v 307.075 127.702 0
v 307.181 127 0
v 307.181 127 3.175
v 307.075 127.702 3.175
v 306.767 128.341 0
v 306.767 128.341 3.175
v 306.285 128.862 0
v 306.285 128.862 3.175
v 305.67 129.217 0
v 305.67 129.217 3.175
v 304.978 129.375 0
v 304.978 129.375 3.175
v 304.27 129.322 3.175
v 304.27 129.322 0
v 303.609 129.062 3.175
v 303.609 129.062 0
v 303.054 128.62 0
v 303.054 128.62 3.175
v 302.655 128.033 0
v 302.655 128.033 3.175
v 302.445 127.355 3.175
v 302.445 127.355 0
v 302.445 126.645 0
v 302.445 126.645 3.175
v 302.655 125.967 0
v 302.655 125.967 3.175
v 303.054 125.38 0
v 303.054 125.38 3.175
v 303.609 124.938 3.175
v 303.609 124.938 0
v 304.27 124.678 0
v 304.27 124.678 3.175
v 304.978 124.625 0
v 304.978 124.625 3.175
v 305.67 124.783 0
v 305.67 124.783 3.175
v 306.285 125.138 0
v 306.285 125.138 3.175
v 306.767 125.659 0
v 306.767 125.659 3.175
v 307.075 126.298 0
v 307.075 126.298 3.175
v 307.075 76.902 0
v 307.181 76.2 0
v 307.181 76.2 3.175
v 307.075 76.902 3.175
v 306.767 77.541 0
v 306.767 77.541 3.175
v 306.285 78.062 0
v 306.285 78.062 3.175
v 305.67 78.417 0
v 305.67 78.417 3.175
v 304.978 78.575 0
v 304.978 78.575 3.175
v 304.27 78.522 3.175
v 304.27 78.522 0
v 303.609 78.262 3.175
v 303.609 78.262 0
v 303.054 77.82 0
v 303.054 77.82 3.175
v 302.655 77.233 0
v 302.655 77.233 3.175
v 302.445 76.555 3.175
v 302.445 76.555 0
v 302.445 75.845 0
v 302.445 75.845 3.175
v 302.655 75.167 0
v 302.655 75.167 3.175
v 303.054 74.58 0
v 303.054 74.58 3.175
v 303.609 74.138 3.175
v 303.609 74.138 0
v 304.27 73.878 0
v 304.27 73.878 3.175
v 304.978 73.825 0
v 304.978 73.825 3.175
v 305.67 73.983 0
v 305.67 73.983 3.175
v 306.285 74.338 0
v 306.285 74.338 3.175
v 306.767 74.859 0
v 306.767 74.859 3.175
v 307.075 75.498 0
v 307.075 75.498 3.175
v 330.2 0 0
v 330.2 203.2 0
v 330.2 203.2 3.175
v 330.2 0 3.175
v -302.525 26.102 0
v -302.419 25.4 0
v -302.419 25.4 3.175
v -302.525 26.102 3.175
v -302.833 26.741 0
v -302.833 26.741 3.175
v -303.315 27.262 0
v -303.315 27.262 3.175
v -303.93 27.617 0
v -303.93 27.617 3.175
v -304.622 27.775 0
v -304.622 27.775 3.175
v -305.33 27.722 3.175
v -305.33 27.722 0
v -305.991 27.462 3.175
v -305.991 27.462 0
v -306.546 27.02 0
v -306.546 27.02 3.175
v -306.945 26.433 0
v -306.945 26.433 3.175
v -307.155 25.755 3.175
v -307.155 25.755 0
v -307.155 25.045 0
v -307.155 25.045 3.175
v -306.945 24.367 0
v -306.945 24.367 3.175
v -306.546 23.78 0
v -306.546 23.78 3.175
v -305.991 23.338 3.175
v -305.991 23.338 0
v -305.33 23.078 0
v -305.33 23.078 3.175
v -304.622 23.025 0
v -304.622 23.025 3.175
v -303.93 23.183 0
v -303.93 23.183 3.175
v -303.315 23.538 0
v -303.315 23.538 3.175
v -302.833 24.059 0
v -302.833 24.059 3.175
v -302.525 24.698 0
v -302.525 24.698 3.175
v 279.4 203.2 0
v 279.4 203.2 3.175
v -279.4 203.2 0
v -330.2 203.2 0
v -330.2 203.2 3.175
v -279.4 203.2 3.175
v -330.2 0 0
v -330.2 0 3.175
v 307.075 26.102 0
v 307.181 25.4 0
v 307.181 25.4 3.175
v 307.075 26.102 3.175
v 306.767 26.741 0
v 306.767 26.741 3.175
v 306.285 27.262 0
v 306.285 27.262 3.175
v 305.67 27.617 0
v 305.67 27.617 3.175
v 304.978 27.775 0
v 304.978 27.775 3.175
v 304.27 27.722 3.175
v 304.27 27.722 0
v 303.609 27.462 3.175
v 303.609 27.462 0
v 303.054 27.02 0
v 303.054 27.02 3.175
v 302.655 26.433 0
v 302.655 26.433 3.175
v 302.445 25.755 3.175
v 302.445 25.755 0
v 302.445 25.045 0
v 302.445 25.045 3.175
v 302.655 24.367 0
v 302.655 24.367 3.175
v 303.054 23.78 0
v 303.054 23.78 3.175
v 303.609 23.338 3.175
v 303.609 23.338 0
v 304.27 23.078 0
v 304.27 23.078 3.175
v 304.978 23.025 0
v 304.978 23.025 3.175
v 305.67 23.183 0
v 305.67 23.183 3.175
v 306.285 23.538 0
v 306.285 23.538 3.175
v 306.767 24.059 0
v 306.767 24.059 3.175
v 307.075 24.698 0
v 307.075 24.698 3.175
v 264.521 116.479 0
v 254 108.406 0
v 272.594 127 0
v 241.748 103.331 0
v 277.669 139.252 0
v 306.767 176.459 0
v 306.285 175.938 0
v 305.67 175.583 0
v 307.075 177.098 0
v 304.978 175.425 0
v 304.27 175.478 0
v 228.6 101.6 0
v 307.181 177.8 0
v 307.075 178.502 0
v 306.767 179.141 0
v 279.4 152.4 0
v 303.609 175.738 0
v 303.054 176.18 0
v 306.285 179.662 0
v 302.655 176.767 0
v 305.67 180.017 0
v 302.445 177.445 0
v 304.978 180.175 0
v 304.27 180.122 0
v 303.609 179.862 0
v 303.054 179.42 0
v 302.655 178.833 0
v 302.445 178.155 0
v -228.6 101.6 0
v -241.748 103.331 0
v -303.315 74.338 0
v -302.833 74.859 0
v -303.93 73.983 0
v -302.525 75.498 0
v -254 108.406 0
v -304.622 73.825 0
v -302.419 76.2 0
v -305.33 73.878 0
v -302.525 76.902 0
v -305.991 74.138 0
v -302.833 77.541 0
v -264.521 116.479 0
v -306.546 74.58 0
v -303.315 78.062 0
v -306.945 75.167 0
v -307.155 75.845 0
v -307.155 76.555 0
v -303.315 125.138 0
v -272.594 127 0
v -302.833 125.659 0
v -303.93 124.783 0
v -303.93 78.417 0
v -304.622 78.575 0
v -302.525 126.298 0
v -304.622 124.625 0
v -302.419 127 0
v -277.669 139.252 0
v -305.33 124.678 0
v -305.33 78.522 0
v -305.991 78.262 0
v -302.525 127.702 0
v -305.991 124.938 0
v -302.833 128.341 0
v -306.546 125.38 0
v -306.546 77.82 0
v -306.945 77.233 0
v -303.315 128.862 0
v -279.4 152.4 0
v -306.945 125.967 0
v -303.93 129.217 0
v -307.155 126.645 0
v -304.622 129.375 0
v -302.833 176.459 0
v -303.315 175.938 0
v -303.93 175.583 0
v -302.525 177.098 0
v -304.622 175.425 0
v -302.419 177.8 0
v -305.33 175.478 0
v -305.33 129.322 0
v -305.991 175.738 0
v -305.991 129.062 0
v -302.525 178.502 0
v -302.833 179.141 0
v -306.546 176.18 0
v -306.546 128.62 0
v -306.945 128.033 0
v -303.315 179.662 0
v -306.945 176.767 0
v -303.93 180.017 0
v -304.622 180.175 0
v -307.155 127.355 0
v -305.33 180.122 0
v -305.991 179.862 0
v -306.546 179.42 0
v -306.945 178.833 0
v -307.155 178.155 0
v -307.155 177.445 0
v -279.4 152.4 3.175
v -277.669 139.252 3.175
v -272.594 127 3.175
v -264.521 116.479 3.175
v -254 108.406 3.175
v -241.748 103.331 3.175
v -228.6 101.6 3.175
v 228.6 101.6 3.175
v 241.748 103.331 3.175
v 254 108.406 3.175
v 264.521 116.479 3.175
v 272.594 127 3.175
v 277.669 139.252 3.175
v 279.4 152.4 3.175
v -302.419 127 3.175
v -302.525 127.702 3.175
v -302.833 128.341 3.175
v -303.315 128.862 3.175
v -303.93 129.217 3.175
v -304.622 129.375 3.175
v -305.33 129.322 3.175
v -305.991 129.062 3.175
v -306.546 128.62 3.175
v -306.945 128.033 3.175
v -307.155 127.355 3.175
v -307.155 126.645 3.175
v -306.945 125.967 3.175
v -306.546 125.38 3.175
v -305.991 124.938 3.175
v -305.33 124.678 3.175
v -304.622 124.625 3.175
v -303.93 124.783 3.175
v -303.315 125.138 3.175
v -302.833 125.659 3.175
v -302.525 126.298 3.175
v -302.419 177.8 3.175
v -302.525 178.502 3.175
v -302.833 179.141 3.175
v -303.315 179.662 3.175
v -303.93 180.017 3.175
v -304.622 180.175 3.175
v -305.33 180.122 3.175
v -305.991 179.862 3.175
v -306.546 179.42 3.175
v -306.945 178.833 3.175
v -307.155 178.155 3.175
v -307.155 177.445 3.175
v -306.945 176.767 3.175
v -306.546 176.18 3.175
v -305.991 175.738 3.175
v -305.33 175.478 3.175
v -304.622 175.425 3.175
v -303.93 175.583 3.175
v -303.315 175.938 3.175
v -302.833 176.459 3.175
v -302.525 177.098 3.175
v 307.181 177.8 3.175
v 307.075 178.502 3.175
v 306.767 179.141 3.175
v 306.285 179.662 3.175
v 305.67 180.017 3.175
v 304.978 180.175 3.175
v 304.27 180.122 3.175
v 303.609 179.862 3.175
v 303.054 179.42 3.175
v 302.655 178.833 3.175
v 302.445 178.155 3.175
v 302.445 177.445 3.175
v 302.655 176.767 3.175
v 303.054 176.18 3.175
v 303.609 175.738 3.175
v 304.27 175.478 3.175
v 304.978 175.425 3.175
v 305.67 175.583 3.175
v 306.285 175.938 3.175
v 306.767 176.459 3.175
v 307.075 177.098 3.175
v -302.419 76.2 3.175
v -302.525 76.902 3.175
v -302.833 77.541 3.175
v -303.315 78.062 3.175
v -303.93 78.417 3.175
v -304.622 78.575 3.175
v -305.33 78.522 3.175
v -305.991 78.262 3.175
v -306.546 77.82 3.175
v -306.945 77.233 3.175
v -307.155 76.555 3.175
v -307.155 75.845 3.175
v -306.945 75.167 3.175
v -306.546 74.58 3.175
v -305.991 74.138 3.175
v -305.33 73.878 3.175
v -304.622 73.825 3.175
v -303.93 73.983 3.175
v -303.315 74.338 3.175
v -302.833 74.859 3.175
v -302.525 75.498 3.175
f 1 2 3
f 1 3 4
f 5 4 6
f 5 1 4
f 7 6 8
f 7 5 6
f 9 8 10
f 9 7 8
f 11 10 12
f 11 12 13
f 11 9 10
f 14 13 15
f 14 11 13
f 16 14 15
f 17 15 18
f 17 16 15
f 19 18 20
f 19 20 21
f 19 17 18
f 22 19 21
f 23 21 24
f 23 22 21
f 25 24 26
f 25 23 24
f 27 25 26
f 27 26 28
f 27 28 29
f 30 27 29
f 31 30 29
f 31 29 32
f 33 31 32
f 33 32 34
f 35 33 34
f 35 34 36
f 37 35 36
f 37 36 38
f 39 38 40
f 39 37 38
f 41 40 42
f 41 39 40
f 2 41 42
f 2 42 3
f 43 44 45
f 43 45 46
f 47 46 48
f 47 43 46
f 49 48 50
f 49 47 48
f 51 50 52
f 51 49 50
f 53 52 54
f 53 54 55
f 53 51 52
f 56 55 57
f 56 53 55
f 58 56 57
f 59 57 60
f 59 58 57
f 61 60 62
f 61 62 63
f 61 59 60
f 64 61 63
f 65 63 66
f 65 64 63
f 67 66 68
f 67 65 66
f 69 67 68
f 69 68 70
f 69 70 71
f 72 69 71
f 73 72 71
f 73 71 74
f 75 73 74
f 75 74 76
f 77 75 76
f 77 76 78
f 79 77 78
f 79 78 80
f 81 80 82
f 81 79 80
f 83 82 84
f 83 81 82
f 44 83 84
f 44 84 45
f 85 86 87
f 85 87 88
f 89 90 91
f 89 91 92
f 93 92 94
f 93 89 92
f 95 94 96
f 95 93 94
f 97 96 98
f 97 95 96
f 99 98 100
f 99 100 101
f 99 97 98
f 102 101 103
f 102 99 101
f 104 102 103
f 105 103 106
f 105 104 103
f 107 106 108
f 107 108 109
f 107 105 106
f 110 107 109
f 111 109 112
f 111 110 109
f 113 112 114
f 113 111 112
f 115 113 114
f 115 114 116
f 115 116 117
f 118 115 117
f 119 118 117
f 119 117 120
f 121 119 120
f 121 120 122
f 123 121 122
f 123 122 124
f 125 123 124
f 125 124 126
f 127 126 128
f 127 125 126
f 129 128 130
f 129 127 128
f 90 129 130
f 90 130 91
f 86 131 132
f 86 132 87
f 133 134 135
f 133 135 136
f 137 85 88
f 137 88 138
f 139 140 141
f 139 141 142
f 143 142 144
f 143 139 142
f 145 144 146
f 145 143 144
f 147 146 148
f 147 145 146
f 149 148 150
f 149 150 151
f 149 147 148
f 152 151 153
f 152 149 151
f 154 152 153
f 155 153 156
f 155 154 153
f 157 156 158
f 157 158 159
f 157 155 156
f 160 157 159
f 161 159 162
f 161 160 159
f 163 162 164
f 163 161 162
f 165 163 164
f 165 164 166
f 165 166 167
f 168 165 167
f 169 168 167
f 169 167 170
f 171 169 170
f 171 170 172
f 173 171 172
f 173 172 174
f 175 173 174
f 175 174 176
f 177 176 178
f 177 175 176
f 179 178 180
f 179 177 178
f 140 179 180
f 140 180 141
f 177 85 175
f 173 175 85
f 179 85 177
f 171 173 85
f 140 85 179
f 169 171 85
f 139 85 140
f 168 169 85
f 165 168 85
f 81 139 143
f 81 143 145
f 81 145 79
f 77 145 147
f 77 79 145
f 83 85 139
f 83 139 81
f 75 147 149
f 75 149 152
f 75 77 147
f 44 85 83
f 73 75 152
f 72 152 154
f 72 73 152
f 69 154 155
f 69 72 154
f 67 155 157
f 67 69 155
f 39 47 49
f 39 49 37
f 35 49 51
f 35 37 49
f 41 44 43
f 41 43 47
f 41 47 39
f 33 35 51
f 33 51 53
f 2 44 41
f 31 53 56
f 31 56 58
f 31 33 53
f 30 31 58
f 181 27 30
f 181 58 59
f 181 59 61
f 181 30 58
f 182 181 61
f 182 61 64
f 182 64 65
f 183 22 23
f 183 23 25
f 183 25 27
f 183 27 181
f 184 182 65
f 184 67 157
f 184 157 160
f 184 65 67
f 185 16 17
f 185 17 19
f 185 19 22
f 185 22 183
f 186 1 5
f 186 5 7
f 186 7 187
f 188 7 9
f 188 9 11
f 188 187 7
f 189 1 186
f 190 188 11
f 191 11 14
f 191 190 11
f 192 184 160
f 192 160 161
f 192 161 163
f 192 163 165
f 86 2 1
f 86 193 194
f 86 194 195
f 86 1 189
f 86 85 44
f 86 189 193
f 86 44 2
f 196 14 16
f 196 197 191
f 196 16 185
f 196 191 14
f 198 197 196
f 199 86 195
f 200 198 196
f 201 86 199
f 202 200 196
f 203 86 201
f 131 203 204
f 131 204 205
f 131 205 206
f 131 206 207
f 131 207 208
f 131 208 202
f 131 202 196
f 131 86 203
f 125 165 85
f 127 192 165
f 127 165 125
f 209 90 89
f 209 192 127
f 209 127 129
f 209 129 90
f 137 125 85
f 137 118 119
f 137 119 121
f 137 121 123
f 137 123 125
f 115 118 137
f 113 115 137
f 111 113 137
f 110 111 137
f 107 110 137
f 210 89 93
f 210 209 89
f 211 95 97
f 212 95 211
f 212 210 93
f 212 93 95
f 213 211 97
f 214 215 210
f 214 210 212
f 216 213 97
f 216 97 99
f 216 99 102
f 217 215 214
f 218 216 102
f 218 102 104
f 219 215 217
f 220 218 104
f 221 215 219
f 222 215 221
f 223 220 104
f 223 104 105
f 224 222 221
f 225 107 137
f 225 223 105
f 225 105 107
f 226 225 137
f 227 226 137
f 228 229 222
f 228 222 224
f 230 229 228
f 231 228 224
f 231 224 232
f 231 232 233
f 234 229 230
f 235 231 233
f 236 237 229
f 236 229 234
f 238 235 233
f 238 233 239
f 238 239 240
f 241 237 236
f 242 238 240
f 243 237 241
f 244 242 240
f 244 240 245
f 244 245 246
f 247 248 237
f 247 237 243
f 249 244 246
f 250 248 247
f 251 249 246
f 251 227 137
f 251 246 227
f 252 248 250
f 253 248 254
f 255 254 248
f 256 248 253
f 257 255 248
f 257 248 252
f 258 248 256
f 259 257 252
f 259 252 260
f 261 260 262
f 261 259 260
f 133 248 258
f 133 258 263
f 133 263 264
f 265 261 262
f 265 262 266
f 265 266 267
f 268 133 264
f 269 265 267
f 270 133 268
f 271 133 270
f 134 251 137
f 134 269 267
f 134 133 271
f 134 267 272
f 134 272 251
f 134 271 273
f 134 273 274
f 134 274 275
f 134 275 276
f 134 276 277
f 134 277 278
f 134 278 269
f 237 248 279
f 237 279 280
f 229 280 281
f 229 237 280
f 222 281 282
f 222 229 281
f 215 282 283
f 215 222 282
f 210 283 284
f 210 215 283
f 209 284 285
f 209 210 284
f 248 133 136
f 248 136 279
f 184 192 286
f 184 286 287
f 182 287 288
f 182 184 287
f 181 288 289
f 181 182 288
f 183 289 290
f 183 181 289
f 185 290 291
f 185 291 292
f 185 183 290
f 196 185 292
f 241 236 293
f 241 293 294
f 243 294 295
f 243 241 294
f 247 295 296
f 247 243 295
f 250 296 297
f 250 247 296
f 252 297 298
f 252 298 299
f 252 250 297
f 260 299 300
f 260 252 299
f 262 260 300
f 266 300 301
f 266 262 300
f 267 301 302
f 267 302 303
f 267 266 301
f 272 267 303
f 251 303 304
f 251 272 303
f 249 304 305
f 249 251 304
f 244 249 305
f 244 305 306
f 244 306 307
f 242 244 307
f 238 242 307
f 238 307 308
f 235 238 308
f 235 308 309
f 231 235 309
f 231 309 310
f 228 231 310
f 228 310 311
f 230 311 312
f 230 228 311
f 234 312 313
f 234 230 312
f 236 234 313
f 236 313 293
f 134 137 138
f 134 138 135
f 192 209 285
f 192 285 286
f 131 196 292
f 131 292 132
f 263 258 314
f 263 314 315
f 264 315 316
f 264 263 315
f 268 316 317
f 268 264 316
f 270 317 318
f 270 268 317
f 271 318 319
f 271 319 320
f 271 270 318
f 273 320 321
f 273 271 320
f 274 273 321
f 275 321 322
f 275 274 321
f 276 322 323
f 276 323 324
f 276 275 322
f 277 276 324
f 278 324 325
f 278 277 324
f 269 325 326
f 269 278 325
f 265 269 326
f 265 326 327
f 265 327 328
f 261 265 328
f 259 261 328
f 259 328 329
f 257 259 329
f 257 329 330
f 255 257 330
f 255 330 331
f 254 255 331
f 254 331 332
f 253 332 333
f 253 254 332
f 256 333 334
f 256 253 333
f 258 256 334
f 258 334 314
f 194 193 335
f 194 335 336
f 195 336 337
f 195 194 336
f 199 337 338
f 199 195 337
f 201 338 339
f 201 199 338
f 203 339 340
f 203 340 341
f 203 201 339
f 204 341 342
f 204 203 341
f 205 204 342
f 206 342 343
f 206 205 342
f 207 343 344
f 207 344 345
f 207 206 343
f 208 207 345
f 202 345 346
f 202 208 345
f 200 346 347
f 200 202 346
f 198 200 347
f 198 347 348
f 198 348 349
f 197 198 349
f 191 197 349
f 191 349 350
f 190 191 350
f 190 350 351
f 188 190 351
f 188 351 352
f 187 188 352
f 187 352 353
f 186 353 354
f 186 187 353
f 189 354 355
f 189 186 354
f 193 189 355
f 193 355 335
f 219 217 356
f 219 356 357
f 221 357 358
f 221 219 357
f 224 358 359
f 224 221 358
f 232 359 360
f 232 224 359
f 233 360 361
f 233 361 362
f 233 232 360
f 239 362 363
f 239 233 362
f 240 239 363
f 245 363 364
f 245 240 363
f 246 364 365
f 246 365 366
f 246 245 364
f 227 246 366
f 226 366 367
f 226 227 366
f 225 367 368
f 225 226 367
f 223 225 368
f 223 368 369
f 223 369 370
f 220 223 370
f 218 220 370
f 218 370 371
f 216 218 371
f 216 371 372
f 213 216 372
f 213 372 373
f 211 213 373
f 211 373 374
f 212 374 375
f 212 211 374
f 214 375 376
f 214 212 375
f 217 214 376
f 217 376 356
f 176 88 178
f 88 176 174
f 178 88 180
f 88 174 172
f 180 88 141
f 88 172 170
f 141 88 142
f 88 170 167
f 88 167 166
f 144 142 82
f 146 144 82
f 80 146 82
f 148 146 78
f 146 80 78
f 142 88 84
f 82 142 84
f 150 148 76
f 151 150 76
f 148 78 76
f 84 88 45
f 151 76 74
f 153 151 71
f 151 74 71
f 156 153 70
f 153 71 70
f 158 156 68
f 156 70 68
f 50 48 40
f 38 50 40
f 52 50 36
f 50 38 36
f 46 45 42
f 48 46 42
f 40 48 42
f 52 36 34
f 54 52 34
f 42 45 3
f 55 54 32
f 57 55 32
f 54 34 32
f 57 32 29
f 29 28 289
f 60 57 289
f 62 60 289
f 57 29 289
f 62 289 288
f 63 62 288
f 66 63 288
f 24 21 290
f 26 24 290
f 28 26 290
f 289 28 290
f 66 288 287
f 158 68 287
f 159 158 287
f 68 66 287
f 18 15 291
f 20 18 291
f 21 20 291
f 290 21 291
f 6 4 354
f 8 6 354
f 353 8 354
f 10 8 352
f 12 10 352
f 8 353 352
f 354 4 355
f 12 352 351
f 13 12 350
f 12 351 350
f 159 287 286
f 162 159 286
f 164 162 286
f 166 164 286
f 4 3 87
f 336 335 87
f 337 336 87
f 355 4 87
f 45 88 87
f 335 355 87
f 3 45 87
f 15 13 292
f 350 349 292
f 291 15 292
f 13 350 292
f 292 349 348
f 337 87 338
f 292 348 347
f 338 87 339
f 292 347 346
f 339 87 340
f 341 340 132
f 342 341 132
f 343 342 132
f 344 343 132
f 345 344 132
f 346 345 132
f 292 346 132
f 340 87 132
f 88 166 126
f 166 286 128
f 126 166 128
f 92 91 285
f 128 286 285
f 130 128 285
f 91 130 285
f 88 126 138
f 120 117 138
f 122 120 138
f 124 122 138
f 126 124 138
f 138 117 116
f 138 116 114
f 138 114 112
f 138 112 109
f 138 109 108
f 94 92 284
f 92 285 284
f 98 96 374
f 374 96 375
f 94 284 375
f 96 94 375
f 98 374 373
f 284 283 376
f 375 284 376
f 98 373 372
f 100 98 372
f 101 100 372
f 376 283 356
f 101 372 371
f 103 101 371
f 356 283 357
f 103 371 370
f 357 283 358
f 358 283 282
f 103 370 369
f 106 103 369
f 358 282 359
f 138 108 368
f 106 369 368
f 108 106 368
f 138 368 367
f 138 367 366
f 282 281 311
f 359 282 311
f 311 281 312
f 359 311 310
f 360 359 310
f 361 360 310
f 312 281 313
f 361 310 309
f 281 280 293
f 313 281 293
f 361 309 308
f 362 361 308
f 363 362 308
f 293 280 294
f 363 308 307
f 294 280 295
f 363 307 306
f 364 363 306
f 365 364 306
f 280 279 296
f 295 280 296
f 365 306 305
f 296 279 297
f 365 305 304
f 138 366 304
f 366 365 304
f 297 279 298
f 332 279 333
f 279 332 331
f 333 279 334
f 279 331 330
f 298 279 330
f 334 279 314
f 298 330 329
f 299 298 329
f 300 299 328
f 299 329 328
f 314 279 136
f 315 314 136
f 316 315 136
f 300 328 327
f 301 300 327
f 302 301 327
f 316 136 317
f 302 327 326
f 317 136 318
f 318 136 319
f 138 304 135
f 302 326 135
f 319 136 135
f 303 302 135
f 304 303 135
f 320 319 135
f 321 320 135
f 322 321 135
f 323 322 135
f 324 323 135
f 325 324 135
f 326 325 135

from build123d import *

# Parameters (mm, degrees)
SKETCH1_R           = 2.38125
BOSS_EXTRUDE1_DEPTH = 3.175


with BuildPart() as part:
    # Sketch1 → Boss-Extrude1 (new body)
    with BuildSketch(Plane.XY):
        with BuildLine():
            Line((330.2, 0), (-330.2, 0))
            Line((-330.2, 0), (-330.2, 203.2))
            Line((-330.2, 203.2), (-279.4, 203.2))
            Line((-279.4, 203.2), (-279.4, 152.4))
            ThreePointArc((-279.4, 152.4), (-264.521024484, 116.478975516), (-228.6, 101.6))
            Line((-228.6, 101.6), (228.6, 101.6))
            ThreePointArc((228.6, 101.6), (264.521024484, 116.478975516), (279.4, 152.4))
            Line((279.4, 152.4), (279.4, 203.2))
            Line((279.4, 203.2), (330.2, 203.2))
            Line((330.2, 203.2), (330.2, 0))
        make_face()
        with Locations((-304.8, 177.8)):
            Circle(SKETCH1_R, mode=Mode.SUBTRACT)
        with Locations((-304.8, 127)):
            Circle(SKETCH1_R, mode=Mode.SUBTRACT)
        with Locations((-304.8, 76.2)):
            Circle(SKETCH1_R, mode=Mode.SUBTRACT)
        with Locations((-304.8, 25.4)):
            Circle(SKETCH1_R, mode=Mode.SUBTRACT)
        with Locations((304.8, 177.8)):
            Circle(SKETCH1_R, mode=Mode.SUBTRACT)
        with Locations((304.8, 127)):
            Circle(SKETCH1_R, mode=Mode.SUBTRACT)
        with Locations((304.8, 76.2)):
            Circle(SKETCH1_R, mode=Mode.SUBTRACT)
        with Locations((304.8, 25.4)):
            Circle(SKETCH1_R, mode=Mode.SUBTRACT)
    extrude(amount=BOSS_EXTRUDE1_DEPTH)


solid = part.part
